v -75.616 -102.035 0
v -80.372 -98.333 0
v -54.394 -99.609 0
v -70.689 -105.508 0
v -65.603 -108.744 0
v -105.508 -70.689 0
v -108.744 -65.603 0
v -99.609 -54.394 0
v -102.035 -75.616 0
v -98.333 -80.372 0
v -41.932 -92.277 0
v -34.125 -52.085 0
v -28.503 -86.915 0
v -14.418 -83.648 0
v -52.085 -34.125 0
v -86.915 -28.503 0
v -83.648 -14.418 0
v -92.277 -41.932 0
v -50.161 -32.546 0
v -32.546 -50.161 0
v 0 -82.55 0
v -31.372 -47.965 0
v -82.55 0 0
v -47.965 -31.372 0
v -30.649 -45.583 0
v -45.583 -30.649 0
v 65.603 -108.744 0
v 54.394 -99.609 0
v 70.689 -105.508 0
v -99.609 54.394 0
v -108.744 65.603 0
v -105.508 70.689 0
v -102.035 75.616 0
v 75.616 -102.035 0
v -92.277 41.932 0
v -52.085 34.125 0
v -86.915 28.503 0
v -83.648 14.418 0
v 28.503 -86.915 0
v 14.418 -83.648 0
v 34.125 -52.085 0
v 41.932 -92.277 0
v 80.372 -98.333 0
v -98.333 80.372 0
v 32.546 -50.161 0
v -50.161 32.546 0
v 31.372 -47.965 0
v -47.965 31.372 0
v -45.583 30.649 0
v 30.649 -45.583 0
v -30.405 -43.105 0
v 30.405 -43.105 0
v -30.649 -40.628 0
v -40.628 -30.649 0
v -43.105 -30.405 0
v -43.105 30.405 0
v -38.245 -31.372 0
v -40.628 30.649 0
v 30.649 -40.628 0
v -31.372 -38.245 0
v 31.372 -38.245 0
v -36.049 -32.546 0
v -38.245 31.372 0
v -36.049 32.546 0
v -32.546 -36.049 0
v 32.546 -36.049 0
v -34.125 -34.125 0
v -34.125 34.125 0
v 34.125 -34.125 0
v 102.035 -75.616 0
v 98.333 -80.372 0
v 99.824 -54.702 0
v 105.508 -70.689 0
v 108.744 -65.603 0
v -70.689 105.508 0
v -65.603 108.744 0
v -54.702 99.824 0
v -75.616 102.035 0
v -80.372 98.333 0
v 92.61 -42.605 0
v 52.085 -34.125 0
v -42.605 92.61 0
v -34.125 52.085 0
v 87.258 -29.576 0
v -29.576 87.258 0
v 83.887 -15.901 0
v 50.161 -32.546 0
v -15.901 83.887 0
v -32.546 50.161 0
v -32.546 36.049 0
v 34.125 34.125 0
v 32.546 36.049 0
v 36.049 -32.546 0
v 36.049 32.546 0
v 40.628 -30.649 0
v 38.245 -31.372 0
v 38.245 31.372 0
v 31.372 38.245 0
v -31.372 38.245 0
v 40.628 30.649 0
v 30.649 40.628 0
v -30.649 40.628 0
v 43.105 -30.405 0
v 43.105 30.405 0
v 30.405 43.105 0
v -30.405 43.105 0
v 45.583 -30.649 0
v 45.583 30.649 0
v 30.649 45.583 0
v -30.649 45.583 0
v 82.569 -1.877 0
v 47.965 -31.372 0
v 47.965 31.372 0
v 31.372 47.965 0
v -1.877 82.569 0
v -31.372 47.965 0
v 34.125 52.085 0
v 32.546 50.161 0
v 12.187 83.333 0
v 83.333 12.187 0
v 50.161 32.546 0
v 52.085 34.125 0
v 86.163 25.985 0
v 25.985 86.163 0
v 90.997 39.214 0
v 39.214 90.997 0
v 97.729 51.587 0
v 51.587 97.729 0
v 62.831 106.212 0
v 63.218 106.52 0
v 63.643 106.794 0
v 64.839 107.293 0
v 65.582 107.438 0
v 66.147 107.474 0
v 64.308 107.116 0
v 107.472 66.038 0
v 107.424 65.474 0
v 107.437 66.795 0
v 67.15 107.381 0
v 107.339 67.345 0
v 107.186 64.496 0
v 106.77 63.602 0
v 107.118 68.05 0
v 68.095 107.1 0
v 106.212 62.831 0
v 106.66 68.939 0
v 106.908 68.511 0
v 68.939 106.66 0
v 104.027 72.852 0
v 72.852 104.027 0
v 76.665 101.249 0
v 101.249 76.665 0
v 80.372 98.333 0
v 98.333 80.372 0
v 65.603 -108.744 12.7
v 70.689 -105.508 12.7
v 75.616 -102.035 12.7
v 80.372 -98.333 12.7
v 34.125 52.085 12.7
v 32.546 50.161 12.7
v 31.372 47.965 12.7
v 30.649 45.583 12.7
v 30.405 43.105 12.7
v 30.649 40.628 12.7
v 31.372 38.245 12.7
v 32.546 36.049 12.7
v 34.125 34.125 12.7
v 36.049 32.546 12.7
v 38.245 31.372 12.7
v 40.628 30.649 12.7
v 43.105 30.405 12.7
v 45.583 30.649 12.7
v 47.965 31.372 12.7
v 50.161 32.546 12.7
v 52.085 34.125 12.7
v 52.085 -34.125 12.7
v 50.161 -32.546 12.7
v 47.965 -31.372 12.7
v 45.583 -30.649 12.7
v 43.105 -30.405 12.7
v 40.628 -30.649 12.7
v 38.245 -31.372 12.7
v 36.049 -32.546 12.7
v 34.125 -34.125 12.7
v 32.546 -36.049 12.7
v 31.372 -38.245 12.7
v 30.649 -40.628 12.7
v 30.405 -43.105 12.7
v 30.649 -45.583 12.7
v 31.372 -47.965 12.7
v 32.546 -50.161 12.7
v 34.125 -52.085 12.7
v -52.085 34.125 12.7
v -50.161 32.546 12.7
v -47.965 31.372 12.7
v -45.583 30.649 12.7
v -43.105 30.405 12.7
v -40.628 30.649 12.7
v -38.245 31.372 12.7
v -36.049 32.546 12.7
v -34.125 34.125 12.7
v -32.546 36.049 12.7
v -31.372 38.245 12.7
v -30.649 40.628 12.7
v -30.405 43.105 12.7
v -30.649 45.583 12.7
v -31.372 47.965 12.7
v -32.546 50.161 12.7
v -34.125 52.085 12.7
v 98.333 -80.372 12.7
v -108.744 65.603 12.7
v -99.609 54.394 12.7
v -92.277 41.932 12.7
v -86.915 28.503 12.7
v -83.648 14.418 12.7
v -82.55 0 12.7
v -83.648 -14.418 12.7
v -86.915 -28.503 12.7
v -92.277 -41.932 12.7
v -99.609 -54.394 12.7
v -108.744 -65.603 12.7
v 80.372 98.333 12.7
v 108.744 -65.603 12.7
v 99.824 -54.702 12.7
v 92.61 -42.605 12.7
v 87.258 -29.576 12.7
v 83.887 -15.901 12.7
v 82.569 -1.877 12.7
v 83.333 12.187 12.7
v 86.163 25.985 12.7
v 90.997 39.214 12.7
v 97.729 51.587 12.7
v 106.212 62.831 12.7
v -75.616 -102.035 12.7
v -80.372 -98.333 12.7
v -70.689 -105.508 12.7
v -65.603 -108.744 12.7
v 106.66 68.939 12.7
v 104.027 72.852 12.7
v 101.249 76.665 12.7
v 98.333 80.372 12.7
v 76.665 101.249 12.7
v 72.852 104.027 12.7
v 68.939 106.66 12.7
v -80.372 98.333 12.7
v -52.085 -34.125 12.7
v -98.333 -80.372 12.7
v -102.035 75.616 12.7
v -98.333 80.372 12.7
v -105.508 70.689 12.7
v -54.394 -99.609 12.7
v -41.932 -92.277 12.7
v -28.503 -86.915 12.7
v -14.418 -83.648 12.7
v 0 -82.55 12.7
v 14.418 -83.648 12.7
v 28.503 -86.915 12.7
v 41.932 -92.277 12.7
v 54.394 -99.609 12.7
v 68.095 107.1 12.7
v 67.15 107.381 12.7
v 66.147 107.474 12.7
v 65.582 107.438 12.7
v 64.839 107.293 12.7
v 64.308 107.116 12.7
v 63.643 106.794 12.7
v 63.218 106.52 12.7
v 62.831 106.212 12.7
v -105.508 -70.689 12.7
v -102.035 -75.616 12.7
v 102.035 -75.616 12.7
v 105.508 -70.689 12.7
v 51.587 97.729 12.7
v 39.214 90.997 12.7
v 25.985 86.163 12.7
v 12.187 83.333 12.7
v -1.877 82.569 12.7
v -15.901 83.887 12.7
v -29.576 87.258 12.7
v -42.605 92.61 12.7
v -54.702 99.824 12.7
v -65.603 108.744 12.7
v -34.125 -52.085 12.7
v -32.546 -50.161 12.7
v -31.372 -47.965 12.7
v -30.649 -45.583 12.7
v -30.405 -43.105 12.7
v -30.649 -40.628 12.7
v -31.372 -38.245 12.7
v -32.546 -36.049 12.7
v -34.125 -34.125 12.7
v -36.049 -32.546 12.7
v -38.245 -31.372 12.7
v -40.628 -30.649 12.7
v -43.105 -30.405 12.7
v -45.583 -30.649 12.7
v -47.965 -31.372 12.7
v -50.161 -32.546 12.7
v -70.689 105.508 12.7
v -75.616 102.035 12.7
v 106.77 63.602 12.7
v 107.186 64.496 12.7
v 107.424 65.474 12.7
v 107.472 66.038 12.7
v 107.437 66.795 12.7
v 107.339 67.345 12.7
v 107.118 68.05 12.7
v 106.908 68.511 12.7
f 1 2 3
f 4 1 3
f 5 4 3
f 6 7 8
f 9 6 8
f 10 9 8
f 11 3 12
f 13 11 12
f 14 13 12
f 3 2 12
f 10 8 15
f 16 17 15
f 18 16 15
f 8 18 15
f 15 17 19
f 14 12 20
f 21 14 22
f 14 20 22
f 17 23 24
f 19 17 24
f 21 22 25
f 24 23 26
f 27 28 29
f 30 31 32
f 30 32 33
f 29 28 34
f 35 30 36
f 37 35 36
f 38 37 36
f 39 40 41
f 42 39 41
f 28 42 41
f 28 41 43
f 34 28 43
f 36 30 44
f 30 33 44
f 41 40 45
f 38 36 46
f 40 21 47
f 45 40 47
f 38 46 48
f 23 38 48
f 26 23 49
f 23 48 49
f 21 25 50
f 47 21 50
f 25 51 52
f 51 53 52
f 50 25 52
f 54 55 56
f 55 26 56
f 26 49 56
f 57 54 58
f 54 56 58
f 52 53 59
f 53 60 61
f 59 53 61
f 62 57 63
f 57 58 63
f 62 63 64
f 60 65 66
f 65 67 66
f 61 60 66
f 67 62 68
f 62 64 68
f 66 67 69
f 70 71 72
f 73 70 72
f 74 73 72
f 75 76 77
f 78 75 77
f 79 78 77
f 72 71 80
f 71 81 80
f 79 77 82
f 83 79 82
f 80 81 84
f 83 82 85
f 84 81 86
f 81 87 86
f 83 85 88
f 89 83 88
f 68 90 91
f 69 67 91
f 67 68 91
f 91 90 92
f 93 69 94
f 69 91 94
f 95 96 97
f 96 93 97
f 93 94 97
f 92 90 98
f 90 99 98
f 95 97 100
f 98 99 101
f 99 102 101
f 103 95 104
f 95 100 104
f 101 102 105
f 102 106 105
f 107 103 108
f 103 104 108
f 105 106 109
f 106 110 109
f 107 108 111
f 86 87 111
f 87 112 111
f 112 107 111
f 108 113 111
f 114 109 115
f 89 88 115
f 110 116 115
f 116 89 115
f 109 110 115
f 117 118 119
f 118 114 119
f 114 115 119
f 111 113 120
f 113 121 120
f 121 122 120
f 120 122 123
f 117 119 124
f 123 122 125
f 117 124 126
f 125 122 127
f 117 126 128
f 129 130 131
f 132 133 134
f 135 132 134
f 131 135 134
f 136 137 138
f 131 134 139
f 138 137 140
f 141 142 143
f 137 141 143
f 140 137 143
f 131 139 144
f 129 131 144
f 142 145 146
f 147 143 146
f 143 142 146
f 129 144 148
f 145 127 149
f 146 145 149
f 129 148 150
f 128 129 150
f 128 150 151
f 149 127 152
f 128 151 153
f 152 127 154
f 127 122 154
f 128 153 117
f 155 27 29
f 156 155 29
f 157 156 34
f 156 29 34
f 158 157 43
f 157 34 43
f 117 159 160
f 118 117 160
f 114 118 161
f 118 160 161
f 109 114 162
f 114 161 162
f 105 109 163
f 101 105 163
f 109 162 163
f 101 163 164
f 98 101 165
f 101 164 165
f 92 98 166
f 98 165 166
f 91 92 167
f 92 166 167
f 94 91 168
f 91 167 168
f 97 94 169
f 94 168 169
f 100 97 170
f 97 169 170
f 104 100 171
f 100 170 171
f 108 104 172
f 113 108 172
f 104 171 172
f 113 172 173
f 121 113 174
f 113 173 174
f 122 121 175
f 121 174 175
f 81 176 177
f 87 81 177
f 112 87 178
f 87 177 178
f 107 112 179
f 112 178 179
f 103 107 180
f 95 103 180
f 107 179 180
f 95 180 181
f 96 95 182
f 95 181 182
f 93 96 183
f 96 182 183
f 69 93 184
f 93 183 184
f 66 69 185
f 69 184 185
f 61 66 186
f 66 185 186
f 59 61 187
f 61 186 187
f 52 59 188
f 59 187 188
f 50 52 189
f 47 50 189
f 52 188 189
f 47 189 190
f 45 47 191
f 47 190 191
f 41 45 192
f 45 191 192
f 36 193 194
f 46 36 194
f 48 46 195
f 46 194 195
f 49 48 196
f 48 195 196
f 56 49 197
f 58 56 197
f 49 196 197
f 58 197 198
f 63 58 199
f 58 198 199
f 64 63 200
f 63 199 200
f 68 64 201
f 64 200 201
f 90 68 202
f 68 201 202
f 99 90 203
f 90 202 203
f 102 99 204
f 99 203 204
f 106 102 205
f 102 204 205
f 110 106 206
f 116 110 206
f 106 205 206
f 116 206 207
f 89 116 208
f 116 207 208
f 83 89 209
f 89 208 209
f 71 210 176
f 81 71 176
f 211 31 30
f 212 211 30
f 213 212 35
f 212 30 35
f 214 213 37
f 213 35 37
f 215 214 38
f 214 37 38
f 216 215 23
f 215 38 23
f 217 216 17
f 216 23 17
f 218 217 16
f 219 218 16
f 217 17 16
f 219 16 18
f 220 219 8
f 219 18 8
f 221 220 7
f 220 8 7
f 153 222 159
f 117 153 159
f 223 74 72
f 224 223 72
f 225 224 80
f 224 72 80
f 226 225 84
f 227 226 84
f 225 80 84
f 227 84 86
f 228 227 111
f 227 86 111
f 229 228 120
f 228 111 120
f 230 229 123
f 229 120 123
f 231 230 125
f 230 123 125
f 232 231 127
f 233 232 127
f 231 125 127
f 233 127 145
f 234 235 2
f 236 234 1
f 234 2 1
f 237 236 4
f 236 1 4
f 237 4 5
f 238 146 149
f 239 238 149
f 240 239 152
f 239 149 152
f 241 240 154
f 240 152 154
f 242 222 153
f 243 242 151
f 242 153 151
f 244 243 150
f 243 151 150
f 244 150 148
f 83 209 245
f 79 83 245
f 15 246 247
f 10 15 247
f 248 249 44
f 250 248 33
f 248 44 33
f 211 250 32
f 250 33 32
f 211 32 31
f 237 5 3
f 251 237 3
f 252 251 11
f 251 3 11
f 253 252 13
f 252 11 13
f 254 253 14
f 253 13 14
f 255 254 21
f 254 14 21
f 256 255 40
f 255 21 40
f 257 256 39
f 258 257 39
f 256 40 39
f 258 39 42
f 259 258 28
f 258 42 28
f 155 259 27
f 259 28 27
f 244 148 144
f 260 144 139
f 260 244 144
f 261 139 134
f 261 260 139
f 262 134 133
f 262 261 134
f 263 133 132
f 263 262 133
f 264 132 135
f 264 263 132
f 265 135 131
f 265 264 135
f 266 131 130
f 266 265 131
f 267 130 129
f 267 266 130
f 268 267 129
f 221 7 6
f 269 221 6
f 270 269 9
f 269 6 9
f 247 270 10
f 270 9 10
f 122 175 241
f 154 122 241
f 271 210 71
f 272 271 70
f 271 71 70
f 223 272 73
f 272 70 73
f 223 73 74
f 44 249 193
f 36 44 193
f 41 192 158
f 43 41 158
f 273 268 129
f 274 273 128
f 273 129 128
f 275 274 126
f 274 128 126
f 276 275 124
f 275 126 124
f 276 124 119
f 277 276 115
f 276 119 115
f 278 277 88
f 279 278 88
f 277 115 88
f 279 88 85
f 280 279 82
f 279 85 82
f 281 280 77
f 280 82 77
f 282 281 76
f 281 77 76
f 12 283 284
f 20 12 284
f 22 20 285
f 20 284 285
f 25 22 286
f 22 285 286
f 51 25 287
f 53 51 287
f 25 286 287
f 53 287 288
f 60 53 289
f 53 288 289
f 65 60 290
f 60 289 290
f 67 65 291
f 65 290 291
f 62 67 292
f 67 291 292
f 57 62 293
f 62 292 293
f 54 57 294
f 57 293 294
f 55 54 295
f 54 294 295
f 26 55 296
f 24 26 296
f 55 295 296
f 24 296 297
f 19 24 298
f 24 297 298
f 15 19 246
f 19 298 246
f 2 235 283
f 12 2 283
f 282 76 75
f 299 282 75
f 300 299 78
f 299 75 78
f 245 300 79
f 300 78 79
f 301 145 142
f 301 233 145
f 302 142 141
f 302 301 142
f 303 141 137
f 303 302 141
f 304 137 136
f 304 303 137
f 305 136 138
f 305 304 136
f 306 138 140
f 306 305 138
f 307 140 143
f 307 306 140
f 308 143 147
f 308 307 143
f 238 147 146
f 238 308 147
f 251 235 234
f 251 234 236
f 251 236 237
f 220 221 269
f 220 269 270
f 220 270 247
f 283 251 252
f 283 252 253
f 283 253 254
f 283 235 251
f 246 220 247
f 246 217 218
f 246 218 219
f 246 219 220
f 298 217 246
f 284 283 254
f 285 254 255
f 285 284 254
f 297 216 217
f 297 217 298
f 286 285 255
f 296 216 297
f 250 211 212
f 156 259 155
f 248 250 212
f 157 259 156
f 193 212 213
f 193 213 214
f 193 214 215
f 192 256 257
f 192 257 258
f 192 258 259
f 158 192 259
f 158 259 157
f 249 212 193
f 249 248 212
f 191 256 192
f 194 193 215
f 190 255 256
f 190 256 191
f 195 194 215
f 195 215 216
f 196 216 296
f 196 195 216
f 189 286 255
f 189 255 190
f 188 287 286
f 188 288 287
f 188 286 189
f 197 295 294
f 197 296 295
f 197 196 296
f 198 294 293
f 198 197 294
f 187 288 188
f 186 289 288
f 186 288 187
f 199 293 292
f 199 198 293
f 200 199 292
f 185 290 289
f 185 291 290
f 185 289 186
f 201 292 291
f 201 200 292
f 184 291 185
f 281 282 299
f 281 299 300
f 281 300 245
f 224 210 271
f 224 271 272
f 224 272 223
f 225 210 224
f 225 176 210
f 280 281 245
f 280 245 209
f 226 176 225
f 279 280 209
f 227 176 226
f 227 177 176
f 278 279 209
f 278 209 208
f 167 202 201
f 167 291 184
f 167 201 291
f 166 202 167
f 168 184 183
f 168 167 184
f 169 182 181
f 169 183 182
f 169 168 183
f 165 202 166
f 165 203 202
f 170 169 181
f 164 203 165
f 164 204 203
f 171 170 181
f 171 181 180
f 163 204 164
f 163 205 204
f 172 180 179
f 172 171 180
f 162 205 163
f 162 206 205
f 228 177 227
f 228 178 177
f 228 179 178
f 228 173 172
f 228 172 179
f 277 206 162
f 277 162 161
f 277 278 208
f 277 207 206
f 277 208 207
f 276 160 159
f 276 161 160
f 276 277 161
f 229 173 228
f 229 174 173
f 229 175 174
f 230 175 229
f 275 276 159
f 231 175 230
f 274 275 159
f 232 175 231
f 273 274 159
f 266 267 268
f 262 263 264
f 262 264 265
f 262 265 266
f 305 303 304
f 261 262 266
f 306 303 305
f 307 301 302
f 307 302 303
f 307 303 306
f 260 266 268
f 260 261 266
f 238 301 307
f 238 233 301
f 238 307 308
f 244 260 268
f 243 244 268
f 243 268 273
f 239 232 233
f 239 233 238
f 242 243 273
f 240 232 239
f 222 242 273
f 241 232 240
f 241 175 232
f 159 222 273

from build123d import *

# Parameters (mm, degrees)
F1_DEPTH = 12.7
F3_R     = 5.08
F4_DEPTH = 25.4


with BuildPart() as f1:
    # F0 (on Top) → F1 (new body)
    with BuildSketch(Plane.XY):
        with BuildLine():
            ThreePointArc((108.74375, -65.6033294577), (82.55, 0), (108.74375, 65.6033294577))
            ThreePointArc((108.74375, 65.6033294577), (89.8025612107, 89.8025612107), (65.6033294577, 108.74375))
            ThreePointArc((65.6033294577, 108.74375), (0, 82.55), (-65.6033294577, 108.74375))
            ThreePointArc((-65.6033294577, 108.74375), (-89.8025612107, 89.8025612107), (-108.74375, 65.6033294577))
            ThreePointArc((-108.74375, 65.6033294577), (-82.55, 0), (-108.74375, -65.6033294577))
            ThreePointArc((-108.74375, -65.6033294577), (-89.8025612107, -89.8025612107), (-65.6033294577, -108.74375))
            ThreePointArc((-65.6033294577, -108.74375), (0, -82.55), (65.6033294577, -108.74375))
            ThreePointArc((65.6033294577, -108.74375), (89.8025612107, -89.8025612107), (108.74375, -65.6033294577))
        make_face()
    extrude(amount=F1_DEPTH)

    # F3
    f3_edges = [f1.edges().sort_by_distance(p)[0] for p in [
        (65.603329, 108.74375, 6.35),
        (108.74375, 65.603329, 6.35),
    ]]
    fillet(f3_edges, radius=F3_R)

    # F2 (on face) → F4 (cut)
    with BuildSketch(Plane.XY.offset(12.7)):
        with BuildLine():
            Line((105.9670222286, 88.0065099865), (96.9867661075, 96.9867661075))
            Line((96.9867661075, 96.9867661075), (88.0065099865, 105.9670222286))
            Line((88.0065099865, 105.9670222286), (34.1249732601, 52.0854855022))
            ThreePointArc((34.1249732601, 52.0854855022), (34.1249732601, 34.1249732601), (52.0854855022, 34.1249732601))
            Line((52.0854855022, 34.1249732601), (105.9670222286, 88.0065099865))
        make_face()
        with BuildLine():
            ThreePointArc((-52.0854855022, 34.1249732601), (-34.1249732601, 34.1249732601), (-34.1249732601, 52.0854855022))
            Line((-34.1249732601, 52.0854855022), (-88.0065099865, 105.9670222286))
            Line((-88.0065099865, 105.9670222286), (-96.9867661075, 96.9867661075))
            Line((-96.9867661075, 96.9867661075), (-105.9670222286, 88.0065099865))
            Line((-105.9670222286, 88.0065099865), (-52.0854855022, 34.1249732601))
        make_face()
        with BuildLine():
            Line((-88.0065099865, -105.9670222286), (-34.1249732601, -52.0854855022))
            ThreePointArc((-34.1249732601, -52.0854855022), (-34.1249732601, -34.1249732601), (-52.0854855022, -34.1249732601))
            Line((-52.0854855022, -34.1249732601), (-105.9670222286, -88.0065099865))
            Line((-105.9670222286, -88.0065099865), (-96.9867661075, -96.9867661075))
            Line((-96.9867661075, -96.9867661075), (-88.0065099865, -105.9670222286))
        make_face()
        with BuildLine():
            Line((34.1249732601, -52.0854855022), (88.0065099865, -105.9670222286))
            Line((88.0065099865, -105.9670222286), (96.9867661075, -96.9867661075))
            Line((96.9867661075, -96.9867661075), (105.9670222286, -88.0065099865))
            Line((105.9670222286, -88.0065099865), (52.0854855022, -34.1249732601))
            ThreePointArc((52.0854855022, -34.1249732601), (34.1249732601, -34.1249732601), (34.1249732601, -52.0854855022))
        make_face()
    extrude(amount=-F4_DEPTH, mode=Mode.SUBTRACT)


solid = f1.part
